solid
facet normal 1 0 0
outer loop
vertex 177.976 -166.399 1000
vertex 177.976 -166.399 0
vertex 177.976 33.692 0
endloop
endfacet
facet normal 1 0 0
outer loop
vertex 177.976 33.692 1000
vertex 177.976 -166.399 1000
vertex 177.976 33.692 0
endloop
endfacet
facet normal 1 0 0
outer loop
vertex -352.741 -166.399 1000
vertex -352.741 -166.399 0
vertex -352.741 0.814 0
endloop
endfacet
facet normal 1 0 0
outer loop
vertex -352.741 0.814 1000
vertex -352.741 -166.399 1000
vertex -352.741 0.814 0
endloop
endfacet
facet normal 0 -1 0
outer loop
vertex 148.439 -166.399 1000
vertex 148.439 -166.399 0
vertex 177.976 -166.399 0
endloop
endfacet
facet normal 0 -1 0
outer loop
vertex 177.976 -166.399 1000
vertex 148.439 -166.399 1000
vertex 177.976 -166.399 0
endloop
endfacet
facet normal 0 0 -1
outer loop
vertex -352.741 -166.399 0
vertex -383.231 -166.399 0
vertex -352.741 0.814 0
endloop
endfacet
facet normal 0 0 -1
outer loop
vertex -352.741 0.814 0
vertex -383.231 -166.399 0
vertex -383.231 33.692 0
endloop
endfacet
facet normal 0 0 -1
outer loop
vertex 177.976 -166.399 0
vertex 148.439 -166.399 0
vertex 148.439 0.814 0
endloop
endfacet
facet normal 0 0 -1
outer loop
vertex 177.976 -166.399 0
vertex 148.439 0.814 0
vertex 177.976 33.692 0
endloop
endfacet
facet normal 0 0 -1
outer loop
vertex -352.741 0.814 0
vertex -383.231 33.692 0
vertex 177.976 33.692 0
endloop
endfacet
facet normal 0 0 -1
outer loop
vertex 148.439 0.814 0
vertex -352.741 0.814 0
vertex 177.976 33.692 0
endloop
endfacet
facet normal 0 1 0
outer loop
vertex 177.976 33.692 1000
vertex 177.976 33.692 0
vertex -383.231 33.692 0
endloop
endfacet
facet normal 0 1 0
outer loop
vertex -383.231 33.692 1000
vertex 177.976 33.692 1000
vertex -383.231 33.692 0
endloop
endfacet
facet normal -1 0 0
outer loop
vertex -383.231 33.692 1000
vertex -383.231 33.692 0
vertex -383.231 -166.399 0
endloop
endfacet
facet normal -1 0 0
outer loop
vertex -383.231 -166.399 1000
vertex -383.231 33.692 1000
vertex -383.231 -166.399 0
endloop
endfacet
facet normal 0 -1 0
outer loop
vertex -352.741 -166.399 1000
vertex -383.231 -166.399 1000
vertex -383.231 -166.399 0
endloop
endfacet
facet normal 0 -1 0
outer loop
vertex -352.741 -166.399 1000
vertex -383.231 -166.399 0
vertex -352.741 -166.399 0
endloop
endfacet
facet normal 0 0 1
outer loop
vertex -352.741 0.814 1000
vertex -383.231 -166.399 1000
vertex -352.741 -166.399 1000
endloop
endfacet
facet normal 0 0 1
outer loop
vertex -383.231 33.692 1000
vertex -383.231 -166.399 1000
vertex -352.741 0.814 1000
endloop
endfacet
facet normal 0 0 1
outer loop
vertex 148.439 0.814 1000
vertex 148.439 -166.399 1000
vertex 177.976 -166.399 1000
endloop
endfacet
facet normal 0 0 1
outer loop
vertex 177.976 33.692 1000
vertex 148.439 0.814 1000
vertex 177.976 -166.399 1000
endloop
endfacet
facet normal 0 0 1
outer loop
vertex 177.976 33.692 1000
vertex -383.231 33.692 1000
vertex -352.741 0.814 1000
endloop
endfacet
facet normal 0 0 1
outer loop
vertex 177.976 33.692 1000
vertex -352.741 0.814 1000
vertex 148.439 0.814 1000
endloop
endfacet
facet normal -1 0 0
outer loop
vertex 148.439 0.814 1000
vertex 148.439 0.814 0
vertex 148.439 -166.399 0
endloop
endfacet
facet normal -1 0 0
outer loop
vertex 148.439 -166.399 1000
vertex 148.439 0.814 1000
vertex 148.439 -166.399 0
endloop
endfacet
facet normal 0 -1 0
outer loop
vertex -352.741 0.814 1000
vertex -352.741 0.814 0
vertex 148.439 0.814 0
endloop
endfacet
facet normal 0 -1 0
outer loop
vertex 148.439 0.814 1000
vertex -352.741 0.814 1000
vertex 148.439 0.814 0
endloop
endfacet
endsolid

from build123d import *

# Parameters (mm, degrees)
F0_W     = 501.1803507805
F0_H     = 32.8778875992
F1_DEPTH = 1000


with BuildPart() as f1:
    # F0 (on Top) → F1 (new body)
    with BuildSketch(Plane.XY):
        Polygon((-352.7414500713, 0.8144499734), (-352.7414500713, 33.6923375726), (-383.2314908504, 33.6923375726), (-383.2314908504, -166.3986742496), (-352.7414500713, -166.3986742496), align=None)
        with Locations((-102.1512746811, 17.253393773)):
            Rectangle(F0_W, F0_H)
        Polygon((177.9761463404, 33.6923375726), (148.4389007092, 33.6923375726), (148.4389007092, 0.8144499734), (148.4389007092, -166.3986742496), (177.9761463404, -166.3986742496), align=None)
    extrude(amount=F1_DEPTH)


solid = f1.part
